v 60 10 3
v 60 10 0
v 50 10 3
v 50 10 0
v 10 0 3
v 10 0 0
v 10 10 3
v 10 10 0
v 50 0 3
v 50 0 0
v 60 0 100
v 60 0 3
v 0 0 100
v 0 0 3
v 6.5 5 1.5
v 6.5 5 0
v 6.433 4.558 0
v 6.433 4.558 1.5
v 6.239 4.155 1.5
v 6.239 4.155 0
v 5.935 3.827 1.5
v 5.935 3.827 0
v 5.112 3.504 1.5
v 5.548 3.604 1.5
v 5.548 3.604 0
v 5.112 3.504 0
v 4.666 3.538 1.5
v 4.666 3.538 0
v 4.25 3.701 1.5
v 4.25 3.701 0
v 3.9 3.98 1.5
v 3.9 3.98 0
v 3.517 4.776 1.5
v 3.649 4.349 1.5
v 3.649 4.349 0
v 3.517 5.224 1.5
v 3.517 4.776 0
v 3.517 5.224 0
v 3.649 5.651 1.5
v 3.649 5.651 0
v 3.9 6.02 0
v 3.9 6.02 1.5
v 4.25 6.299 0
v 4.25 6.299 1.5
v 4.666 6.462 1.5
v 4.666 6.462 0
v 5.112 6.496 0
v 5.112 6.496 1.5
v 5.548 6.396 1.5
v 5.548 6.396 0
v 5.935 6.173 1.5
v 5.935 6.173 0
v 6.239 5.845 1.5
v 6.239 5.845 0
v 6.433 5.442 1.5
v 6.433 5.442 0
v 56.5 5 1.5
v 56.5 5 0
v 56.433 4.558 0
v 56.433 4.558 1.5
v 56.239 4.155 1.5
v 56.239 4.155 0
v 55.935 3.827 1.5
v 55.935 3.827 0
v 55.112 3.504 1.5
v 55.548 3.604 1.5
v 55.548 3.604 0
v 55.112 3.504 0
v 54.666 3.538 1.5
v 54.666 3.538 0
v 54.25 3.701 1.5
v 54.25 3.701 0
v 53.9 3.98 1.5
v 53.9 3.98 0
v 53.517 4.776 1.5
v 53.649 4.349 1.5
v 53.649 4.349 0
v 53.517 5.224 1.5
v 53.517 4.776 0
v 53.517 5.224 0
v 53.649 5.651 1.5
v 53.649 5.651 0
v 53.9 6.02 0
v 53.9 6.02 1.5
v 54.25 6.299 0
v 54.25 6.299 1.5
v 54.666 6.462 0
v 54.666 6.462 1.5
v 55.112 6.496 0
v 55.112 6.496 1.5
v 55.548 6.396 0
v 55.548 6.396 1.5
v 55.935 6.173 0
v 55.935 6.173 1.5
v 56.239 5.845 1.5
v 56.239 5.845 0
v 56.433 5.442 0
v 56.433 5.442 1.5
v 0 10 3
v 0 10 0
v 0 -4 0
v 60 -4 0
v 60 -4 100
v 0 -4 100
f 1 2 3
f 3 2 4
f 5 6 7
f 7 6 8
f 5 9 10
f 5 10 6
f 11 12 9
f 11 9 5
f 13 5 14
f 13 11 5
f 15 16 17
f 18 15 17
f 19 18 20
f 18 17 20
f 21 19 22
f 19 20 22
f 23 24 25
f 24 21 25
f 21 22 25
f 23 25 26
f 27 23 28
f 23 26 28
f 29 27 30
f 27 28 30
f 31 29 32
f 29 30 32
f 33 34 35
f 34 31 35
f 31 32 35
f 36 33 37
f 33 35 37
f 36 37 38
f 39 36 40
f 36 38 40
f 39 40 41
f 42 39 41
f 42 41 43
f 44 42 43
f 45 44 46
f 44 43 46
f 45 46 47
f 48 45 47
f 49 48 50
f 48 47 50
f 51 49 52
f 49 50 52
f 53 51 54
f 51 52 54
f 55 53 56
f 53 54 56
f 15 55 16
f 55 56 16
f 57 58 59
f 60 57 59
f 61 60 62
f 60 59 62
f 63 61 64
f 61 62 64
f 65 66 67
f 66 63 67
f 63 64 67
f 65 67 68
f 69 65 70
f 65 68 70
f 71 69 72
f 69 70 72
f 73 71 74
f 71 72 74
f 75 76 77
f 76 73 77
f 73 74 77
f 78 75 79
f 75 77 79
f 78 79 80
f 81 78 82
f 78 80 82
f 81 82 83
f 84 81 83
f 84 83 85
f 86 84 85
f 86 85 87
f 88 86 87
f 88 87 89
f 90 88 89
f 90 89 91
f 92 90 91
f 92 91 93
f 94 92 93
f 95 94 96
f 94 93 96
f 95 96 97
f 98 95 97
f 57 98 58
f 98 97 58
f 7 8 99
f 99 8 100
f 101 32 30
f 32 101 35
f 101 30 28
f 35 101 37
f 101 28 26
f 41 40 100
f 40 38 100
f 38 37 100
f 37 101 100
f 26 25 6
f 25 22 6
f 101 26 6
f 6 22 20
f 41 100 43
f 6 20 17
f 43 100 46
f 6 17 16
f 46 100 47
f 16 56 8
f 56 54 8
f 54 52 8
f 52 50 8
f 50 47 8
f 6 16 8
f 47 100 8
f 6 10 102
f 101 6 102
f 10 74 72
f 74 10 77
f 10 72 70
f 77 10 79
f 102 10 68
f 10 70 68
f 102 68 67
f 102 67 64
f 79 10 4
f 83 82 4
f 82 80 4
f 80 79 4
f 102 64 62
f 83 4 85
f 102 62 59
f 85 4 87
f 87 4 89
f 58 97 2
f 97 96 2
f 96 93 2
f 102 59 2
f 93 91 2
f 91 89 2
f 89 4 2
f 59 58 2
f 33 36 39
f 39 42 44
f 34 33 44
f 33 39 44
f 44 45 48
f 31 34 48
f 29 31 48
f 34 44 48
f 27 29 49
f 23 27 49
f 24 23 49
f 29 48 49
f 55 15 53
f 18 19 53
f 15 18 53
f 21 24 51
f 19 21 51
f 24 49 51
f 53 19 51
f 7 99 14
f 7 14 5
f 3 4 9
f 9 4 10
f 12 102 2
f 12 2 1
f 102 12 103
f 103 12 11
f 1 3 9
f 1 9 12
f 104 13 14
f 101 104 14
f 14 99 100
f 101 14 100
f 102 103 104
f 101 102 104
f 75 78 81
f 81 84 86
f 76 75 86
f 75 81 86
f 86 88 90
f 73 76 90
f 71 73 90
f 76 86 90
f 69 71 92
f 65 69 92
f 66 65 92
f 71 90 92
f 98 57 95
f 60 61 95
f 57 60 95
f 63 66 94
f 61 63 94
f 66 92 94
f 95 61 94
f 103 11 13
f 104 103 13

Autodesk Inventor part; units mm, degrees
ref_plane "YZ Plane" through (0, 0, 0) normal (1, 0, 0) x (0, 1, 0)
ref_plane "XZ Plane" through (0, 0, 0) normal (0, 1, 0) x (-1, 0, 0)
ref_plane "XY Plane" through (0, 0, 0) normal (0, 0, 1) x (1, 0, 0)
sketch "草圖1" plane through (0, 0, 0) normal (0, 0, 1) x (1, 0, 0)
  line L0 (0, 0) -> (10, 0)
  line L1 (10, 0) -> (10, 10)
  line L2 (10, 10) -> (0, 10)
  line L3 (0, 10) -> (0, 0)
  circle A0 centre (5, 5) radius 1.5
  point P0 (5, 10)
  point P1 (10, 5)
  dimension "d0" = 10
  dimension "d1" = 10
  dimension "d2" = 3
extrude "擠出1" add sketch "草圖1" along normal blind 3 contours L3 L2 L1 L0 | A0
extrude "擠出2" cut sketch "草圖1" along normal blind 1.5 contours A0
sketch "草圖2" plane through (0, 0, 0) normal (0, 1, 0) x (-1, 0, 0)
  line L0 (0, 0) -> (-60, 0)
  line L1 (-60, 0) -> (-60, 100)
  line L2 (-60, 100) -> (0, 100)
  line L3 (0, 100) -> (0, 0)
  dimension "d7" = 60
  dimension "d8" = 100
pattern_linear "矩形陣列1" count 2 spacing 50 along (1, 0, 0) of "擠出2", "擠出1"
extrude "擠出3" add sketch "草圖2" against normal blind 4
properties part number "110033226_ipt_42_城堡門口橋"
